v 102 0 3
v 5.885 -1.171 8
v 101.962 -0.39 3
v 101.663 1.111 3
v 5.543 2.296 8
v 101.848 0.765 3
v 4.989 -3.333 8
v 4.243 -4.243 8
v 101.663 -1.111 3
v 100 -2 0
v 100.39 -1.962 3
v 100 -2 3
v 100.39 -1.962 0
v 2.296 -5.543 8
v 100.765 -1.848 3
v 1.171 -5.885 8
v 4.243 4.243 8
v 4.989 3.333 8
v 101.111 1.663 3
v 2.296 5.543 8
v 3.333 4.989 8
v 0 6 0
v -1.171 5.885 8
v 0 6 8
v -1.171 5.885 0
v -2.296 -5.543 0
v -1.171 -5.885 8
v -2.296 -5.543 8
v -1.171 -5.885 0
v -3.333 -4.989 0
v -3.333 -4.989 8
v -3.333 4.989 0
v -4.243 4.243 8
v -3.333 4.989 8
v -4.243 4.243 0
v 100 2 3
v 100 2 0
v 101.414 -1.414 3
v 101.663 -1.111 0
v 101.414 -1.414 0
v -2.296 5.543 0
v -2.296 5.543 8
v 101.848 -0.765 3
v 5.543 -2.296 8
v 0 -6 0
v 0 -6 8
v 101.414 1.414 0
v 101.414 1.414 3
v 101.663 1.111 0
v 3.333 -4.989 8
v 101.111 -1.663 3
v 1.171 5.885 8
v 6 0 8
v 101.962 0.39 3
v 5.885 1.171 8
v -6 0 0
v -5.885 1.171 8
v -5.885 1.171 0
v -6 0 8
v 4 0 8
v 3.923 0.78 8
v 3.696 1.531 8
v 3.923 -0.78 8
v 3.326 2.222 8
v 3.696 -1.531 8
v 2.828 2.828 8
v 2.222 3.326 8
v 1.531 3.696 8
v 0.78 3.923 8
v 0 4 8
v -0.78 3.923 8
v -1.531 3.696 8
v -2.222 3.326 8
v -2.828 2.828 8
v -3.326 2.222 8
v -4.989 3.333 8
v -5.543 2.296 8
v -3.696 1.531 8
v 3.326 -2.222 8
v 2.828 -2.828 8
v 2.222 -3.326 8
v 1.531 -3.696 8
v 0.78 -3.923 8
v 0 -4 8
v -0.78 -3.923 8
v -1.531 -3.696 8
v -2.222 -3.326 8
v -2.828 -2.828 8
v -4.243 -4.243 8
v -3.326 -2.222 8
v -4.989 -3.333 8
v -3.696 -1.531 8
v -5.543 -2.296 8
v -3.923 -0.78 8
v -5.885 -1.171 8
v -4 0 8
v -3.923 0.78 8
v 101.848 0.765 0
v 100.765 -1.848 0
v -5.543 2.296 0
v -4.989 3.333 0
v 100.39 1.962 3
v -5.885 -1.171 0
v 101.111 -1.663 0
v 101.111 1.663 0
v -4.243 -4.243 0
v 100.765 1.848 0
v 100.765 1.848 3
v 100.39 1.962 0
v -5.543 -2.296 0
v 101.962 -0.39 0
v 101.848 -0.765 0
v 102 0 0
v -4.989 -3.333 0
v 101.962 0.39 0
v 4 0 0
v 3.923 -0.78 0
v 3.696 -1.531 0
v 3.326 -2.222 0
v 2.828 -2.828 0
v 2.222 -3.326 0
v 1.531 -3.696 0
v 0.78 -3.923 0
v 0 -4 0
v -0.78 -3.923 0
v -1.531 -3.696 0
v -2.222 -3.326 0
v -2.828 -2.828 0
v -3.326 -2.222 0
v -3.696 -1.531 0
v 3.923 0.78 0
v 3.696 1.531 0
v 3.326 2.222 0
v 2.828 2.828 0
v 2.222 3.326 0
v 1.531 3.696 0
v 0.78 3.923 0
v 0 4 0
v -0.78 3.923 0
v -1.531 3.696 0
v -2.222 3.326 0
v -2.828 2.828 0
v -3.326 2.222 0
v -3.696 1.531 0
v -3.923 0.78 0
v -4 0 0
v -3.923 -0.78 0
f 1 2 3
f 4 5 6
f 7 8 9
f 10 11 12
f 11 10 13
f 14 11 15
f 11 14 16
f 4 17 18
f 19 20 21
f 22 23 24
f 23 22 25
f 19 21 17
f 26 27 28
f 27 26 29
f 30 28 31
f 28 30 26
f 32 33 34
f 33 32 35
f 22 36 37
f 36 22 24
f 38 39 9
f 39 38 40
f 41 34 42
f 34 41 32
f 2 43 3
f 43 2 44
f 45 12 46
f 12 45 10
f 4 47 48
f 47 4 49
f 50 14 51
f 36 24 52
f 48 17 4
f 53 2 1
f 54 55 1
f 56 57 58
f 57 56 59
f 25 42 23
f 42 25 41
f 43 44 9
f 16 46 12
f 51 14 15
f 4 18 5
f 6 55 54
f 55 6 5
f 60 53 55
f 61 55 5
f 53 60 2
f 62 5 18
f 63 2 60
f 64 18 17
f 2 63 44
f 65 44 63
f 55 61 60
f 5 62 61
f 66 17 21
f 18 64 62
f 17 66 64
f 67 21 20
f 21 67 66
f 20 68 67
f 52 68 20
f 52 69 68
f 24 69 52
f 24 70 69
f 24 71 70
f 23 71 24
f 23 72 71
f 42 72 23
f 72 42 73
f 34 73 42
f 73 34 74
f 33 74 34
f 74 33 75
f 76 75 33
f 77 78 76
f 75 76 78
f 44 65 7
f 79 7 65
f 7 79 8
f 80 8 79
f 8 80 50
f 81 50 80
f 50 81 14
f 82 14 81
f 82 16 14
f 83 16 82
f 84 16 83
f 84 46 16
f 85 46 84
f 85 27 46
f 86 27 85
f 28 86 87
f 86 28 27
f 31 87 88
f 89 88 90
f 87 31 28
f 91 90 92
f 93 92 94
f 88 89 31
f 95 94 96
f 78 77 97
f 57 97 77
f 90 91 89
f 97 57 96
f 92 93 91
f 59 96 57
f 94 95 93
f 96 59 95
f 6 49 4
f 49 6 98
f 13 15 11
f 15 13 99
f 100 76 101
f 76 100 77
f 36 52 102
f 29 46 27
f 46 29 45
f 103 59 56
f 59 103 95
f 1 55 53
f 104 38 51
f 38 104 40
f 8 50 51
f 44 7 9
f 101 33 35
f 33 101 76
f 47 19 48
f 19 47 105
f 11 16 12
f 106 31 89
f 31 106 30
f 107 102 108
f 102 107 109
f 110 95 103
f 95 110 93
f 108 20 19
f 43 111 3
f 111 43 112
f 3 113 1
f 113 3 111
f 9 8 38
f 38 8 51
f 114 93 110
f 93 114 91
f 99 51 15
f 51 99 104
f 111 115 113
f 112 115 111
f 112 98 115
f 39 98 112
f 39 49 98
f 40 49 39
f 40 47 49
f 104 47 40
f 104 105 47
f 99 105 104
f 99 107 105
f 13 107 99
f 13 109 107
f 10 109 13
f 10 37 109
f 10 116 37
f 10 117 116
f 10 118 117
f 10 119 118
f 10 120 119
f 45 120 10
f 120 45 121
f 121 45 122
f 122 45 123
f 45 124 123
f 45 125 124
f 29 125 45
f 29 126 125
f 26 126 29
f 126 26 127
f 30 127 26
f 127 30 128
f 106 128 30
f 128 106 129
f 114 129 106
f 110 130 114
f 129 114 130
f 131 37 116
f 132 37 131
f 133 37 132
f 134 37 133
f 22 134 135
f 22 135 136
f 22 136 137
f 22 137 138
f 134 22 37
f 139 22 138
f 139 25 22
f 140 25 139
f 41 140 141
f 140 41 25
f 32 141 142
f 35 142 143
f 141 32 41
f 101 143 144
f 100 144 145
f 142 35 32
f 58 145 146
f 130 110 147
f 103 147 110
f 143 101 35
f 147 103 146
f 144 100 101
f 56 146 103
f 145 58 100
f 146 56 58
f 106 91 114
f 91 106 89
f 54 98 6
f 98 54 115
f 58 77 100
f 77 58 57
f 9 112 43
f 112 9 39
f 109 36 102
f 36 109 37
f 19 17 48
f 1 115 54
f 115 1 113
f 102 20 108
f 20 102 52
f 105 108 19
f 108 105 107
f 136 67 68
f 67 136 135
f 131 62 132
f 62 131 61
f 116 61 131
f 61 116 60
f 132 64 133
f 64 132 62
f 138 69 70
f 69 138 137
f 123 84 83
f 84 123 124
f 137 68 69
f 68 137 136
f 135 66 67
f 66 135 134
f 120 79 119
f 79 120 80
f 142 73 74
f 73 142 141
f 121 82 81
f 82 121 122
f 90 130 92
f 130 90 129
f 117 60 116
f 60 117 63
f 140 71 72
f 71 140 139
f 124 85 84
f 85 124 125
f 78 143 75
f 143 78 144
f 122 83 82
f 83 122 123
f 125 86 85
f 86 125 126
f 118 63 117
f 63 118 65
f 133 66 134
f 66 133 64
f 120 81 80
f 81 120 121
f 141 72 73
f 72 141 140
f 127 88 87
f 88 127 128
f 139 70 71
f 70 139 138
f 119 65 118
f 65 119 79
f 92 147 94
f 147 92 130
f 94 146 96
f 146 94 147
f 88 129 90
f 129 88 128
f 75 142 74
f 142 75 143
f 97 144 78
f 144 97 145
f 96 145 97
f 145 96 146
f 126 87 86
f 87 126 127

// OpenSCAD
od = 12;
id = 8;
length = 100;
pointDiameter = 4;
thickness = 8;
minThickness = 3;

$fn = 32;

difference() {
    hull() {
        cylinder(d=od,h=thickness);
        translate([length,0]) cylinder(d=pointDiameter,h=minThickness);
    }
    cylinder(d=id,h=3*thickness,center=true);
}
